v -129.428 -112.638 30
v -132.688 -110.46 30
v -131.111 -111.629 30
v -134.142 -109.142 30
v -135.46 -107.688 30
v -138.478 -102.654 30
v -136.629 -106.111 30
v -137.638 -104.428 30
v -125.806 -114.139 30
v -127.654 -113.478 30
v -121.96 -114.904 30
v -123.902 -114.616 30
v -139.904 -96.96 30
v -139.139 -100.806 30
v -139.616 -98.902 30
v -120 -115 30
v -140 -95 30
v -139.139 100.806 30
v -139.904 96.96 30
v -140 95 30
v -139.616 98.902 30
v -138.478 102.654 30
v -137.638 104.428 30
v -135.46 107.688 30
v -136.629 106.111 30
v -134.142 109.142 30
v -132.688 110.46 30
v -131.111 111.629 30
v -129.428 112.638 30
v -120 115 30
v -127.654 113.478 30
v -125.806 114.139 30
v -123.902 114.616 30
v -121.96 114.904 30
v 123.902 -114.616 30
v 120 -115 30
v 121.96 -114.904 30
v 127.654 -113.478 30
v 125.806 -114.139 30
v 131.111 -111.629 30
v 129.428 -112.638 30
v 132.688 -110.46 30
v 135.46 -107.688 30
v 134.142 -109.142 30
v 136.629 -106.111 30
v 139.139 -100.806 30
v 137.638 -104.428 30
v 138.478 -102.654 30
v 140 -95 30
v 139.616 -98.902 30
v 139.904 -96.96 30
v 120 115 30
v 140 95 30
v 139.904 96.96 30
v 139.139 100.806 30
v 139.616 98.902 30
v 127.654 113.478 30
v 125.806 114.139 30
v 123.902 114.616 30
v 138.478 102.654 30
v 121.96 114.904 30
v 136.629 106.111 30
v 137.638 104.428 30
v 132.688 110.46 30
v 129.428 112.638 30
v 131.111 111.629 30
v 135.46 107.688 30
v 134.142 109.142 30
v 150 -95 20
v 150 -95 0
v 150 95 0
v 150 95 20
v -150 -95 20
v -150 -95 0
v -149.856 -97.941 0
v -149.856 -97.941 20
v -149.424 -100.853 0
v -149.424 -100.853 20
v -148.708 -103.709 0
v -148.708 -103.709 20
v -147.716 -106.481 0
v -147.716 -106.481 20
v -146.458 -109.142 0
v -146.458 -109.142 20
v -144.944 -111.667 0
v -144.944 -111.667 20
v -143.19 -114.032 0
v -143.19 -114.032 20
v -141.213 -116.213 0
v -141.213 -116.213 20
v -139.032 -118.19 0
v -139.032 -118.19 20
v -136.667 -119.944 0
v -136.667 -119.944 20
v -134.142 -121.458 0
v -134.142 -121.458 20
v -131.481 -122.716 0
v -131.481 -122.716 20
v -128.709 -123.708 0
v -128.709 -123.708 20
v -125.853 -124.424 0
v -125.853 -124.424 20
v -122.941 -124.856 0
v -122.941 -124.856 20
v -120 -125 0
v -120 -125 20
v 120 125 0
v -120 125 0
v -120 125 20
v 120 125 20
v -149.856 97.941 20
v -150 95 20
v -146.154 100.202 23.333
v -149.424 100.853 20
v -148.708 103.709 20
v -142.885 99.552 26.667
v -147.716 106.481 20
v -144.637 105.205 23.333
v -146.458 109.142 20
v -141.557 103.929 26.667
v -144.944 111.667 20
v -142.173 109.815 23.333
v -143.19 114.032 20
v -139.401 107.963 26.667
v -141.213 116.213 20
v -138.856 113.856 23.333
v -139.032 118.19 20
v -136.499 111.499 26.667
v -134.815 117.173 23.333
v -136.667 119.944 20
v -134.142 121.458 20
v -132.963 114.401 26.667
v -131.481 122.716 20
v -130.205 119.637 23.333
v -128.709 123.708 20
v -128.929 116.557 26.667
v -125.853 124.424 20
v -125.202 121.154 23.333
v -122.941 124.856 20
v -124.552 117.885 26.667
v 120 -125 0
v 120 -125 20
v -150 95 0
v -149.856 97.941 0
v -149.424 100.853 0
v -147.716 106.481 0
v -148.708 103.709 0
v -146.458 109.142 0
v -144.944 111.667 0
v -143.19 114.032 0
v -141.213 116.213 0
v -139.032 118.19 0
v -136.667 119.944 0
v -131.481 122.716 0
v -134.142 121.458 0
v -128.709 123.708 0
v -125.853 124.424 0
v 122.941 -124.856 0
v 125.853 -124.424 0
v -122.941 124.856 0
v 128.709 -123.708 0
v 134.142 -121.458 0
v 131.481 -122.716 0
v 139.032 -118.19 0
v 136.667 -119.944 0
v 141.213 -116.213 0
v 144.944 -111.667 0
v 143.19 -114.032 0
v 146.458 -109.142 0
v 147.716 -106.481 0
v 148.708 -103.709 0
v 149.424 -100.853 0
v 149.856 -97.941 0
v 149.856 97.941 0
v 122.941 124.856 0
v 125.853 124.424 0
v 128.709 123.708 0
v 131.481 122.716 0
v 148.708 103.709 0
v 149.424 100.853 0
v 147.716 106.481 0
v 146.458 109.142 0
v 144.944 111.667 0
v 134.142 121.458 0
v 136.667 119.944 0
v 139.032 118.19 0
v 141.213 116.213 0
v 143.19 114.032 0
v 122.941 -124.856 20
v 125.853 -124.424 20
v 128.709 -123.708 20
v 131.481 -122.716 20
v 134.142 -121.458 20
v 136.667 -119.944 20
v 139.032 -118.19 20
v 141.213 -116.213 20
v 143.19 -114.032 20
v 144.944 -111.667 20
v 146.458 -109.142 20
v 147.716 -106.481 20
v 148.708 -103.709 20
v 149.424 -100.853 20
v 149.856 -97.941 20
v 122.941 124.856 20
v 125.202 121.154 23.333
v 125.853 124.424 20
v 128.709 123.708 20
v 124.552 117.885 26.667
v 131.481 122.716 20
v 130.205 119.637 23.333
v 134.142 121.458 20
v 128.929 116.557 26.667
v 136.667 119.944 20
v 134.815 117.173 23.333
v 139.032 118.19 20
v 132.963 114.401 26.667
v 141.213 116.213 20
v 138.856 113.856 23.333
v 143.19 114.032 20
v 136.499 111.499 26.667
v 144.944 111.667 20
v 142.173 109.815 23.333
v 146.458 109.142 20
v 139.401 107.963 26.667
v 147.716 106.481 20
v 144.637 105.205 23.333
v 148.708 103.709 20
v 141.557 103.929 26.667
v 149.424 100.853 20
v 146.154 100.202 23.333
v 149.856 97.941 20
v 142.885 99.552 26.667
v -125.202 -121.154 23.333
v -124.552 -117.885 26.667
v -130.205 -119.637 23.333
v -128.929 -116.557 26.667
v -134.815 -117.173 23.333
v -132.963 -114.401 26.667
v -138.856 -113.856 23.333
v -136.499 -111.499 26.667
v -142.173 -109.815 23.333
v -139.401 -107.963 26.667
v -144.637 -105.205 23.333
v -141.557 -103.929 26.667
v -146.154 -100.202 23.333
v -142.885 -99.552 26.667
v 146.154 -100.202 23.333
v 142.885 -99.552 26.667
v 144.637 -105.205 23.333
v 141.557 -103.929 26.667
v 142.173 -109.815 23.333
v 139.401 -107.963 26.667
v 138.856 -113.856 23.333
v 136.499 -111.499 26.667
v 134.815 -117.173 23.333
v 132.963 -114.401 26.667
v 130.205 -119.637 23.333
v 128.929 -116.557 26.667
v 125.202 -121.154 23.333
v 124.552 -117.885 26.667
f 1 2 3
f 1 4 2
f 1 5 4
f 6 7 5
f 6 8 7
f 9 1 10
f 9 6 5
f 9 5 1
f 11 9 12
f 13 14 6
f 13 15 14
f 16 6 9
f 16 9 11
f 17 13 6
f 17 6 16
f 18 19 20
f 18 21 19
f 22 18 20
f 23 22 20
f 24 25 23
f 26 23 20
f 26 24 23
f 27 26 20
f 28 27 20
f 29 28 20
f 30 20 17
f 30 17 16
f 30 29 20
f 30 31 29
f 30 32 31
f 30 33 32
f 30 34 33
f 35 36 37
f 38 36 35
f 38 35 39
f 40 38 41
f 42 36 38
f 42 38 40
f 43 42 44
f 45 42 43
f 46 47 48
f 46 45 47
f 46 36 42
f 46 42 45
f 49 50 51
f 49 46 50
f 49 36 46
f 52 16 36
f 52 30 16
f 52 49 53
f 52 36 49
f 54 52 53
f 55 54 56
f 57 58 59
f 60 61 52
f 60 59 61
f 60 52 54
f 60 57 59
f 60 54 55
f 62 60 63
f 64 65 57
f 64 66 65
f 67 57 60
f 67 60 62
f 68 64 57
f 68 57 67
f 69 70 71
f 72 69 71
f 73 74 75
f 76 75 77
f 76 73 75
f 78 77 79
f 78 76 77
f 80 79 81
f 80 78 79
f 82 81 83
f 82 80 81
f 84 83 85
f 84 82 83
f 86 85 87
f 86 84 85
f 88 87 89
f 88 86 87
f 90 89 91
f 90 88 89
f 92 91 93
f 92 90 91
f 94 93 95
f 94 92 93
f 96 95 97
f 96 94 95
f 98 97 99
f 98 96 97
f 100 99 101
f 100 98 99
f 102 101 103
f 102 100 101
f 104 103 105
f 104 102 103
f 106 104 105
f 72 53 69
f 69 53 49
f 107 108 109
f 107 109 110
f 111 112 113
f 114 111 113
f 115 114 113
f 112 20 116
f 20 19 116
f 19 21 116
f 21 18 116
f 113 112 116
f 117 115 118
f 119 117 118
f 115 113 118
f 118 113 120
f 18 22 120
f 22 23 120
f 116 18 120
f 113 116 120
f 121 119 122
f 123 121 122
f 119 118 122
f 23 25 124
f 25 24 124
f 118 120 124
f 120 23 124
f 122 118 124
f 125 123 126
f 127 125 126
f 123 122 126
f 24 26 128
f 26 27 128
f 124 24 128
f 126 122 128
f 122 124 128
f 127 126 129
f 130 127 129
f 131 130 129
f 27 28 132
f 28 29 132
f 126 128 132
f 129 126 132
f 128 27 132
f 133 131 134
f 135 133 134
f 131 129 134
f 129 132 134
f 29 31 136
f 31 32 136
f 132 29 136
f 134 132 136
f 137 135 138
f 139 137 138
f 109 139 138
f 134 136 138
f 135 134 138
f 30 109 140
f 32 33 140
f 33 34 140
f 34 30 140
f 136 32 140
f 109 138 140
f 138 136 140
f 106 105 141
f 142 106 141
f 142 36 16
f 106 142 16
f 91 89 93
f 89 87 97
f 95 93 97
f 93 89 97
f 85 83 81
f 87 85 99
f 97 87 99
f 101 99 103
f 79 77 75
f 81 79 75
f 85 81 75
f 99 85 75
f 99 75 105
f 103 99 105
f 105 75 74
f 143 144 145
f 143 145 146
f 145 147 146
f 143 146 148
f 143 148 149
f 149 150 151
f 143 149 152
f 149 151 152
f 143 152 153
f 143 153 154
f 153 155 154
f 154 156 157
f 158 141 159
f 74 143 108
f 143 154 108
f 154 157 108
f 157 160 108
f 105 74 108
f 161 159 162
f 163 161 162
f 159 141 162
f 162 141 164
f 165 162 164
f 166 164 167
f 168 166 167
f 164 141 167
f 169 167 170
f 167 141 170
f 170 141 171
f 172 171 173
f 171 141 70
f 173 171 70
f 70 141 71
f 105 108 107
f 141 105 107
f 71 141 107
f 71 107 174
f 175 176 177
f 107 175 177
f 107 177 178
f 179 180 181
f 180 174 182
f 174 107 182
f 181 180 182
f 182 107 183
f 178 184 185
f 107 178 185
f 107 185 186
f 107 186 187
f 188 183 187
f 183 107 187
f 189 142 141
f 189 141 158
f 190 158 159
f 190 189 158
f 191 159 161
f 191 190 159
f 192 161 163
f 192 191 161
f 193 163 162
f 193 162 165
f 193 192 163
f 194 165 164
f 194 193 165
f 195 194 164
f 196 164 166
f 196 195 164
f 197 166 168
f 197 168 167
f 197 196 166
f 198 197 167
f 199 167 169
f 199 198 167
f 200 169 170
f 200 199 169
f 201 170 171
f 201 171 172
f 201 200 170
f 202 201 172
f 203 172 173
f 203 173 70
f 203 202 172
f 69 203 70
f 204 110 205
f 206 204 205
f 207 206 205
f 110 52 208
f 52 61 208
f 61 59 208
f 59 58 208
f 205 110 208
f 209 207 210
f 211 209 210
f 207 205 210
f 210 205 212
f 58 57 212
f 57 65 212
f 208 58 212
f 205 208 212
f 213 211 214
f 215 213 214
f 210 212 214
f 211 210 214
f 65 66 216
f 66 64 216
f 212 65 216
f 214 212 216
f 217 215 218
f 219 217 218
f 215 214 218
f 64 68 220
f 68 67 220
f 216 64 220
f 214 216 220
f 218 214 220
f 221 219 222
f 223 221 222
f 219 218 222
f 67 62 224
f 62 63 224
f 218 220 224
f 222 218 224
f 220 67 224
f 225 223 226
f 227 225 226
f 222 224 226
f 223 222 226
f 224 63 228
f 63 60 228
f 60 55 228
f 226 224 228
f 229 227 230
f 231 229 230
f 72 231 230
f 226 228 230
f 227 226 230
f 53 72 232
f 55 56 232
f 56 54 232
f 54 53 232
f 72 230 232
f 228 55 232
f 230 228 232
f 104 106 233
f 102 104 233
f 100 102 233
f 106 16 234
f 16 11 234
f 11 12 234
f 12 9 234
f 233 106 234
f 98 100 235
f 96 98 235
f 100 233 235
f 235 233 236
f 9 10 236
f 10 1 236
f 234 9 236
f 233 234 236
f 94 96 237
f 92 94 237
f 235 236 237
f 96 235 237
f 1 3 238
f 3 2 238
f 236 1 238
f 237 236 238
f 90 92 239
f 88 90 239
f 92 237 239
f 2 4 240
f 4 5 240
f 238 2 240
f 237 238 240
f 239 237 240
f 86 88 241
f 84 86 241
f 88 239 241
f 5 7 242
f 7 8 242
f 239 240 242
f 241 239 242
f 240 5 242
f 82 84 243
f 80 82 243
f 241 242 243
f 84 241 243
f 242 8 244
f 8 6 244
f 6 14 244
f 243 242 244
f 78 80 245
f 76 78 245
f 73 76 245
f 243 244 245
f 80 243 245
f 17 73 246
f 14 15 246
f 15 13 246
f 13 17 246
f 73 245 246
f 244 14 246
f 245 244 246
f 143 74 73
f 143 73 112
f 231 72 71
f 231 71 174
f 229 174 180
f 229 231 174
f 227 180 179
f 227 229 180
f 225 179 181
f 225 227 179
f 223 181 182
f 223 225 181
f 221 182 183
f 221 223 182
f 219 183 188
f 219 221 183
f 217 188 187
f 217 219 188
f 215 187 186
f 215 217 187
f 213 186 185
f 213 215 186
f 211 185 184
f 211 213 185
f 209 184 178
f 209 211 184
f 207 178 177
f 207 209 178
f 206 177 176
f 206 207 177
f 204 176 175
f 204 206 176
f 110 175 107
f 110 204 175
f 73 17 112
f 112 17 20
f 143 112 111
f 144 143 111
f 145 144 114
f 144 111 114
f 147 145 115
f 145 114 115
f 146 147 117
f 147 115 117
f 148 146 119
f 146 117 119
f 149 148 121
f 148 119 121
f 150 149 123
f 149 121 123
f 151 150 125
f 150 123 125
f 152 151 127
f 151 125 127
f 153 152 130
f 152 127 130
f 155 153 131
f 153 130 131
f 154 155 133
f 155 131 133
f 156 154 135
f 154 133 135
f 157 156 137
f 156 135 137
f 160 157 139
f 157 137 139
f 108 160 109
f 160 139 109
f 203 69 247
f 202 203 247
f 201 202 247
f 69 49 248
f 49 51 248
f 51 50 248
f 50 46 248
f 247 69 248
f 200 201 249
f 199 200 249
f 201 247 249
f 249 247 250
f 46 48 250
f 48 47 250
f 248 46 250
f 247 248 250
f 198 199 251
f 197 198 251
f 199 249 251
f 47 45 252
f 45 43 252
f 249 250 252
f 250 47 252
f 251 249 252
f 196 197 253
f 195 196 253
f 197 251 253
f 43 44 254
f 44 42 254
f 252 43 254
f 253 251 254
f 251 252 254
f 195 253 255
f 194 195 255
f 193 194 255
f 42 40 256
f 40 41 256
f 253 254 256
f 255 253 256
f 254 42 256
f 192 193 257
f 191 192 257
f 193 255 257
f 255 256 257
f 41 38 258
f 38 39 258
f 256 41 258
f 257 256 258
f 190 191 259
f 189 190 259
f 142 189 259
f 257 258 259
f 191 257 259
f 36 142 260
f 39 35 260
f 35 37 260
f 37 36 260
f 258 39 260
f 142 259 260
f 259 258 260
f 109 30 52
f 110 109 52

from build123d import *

# Parameters (mm, degrees)
F0_W     = 300
F0_H     = 250
F1_DEPTH = 30
F2_R     = 30
F3_SIZE2 = 10
F3_SIZE  = 10


with BuildPart() as f1:
    # F0 (on Top) → F1 (new body)
    with BuildSketch(Plane.XY):
        Rectangle(F0_W, F0_H)
    extrude(amount=F1_DEPTH)

    # F2
    f2_edges = [f1.edges().sort_by_distance(p)[0] for p in [
        (-150, -125, 15),
        (-150, 125, 15),
        (150, 125, 15),
        (150, -125, 15),
    ]]
    fillet(f2_edges, radius=F2_R)

    # F3
    f3_edges = [f1.edges().sort_by_distance(p)[0] for p in [
        (-150, 0, 30),
        (0, 125, 30),
        (150, 0, 30),
        (0, -125, 30),
        (141.213203, -116.213203, 30),
        (141.213203, 116.213203, 30),
        (-141.213203, -116.213203, 30),
        (-141.213203, 116.213203, 30),
    ]]
    chamfer(f3_edges, length=F3_SIZE, length2=F3_SIZE2)


solid = f1.part
